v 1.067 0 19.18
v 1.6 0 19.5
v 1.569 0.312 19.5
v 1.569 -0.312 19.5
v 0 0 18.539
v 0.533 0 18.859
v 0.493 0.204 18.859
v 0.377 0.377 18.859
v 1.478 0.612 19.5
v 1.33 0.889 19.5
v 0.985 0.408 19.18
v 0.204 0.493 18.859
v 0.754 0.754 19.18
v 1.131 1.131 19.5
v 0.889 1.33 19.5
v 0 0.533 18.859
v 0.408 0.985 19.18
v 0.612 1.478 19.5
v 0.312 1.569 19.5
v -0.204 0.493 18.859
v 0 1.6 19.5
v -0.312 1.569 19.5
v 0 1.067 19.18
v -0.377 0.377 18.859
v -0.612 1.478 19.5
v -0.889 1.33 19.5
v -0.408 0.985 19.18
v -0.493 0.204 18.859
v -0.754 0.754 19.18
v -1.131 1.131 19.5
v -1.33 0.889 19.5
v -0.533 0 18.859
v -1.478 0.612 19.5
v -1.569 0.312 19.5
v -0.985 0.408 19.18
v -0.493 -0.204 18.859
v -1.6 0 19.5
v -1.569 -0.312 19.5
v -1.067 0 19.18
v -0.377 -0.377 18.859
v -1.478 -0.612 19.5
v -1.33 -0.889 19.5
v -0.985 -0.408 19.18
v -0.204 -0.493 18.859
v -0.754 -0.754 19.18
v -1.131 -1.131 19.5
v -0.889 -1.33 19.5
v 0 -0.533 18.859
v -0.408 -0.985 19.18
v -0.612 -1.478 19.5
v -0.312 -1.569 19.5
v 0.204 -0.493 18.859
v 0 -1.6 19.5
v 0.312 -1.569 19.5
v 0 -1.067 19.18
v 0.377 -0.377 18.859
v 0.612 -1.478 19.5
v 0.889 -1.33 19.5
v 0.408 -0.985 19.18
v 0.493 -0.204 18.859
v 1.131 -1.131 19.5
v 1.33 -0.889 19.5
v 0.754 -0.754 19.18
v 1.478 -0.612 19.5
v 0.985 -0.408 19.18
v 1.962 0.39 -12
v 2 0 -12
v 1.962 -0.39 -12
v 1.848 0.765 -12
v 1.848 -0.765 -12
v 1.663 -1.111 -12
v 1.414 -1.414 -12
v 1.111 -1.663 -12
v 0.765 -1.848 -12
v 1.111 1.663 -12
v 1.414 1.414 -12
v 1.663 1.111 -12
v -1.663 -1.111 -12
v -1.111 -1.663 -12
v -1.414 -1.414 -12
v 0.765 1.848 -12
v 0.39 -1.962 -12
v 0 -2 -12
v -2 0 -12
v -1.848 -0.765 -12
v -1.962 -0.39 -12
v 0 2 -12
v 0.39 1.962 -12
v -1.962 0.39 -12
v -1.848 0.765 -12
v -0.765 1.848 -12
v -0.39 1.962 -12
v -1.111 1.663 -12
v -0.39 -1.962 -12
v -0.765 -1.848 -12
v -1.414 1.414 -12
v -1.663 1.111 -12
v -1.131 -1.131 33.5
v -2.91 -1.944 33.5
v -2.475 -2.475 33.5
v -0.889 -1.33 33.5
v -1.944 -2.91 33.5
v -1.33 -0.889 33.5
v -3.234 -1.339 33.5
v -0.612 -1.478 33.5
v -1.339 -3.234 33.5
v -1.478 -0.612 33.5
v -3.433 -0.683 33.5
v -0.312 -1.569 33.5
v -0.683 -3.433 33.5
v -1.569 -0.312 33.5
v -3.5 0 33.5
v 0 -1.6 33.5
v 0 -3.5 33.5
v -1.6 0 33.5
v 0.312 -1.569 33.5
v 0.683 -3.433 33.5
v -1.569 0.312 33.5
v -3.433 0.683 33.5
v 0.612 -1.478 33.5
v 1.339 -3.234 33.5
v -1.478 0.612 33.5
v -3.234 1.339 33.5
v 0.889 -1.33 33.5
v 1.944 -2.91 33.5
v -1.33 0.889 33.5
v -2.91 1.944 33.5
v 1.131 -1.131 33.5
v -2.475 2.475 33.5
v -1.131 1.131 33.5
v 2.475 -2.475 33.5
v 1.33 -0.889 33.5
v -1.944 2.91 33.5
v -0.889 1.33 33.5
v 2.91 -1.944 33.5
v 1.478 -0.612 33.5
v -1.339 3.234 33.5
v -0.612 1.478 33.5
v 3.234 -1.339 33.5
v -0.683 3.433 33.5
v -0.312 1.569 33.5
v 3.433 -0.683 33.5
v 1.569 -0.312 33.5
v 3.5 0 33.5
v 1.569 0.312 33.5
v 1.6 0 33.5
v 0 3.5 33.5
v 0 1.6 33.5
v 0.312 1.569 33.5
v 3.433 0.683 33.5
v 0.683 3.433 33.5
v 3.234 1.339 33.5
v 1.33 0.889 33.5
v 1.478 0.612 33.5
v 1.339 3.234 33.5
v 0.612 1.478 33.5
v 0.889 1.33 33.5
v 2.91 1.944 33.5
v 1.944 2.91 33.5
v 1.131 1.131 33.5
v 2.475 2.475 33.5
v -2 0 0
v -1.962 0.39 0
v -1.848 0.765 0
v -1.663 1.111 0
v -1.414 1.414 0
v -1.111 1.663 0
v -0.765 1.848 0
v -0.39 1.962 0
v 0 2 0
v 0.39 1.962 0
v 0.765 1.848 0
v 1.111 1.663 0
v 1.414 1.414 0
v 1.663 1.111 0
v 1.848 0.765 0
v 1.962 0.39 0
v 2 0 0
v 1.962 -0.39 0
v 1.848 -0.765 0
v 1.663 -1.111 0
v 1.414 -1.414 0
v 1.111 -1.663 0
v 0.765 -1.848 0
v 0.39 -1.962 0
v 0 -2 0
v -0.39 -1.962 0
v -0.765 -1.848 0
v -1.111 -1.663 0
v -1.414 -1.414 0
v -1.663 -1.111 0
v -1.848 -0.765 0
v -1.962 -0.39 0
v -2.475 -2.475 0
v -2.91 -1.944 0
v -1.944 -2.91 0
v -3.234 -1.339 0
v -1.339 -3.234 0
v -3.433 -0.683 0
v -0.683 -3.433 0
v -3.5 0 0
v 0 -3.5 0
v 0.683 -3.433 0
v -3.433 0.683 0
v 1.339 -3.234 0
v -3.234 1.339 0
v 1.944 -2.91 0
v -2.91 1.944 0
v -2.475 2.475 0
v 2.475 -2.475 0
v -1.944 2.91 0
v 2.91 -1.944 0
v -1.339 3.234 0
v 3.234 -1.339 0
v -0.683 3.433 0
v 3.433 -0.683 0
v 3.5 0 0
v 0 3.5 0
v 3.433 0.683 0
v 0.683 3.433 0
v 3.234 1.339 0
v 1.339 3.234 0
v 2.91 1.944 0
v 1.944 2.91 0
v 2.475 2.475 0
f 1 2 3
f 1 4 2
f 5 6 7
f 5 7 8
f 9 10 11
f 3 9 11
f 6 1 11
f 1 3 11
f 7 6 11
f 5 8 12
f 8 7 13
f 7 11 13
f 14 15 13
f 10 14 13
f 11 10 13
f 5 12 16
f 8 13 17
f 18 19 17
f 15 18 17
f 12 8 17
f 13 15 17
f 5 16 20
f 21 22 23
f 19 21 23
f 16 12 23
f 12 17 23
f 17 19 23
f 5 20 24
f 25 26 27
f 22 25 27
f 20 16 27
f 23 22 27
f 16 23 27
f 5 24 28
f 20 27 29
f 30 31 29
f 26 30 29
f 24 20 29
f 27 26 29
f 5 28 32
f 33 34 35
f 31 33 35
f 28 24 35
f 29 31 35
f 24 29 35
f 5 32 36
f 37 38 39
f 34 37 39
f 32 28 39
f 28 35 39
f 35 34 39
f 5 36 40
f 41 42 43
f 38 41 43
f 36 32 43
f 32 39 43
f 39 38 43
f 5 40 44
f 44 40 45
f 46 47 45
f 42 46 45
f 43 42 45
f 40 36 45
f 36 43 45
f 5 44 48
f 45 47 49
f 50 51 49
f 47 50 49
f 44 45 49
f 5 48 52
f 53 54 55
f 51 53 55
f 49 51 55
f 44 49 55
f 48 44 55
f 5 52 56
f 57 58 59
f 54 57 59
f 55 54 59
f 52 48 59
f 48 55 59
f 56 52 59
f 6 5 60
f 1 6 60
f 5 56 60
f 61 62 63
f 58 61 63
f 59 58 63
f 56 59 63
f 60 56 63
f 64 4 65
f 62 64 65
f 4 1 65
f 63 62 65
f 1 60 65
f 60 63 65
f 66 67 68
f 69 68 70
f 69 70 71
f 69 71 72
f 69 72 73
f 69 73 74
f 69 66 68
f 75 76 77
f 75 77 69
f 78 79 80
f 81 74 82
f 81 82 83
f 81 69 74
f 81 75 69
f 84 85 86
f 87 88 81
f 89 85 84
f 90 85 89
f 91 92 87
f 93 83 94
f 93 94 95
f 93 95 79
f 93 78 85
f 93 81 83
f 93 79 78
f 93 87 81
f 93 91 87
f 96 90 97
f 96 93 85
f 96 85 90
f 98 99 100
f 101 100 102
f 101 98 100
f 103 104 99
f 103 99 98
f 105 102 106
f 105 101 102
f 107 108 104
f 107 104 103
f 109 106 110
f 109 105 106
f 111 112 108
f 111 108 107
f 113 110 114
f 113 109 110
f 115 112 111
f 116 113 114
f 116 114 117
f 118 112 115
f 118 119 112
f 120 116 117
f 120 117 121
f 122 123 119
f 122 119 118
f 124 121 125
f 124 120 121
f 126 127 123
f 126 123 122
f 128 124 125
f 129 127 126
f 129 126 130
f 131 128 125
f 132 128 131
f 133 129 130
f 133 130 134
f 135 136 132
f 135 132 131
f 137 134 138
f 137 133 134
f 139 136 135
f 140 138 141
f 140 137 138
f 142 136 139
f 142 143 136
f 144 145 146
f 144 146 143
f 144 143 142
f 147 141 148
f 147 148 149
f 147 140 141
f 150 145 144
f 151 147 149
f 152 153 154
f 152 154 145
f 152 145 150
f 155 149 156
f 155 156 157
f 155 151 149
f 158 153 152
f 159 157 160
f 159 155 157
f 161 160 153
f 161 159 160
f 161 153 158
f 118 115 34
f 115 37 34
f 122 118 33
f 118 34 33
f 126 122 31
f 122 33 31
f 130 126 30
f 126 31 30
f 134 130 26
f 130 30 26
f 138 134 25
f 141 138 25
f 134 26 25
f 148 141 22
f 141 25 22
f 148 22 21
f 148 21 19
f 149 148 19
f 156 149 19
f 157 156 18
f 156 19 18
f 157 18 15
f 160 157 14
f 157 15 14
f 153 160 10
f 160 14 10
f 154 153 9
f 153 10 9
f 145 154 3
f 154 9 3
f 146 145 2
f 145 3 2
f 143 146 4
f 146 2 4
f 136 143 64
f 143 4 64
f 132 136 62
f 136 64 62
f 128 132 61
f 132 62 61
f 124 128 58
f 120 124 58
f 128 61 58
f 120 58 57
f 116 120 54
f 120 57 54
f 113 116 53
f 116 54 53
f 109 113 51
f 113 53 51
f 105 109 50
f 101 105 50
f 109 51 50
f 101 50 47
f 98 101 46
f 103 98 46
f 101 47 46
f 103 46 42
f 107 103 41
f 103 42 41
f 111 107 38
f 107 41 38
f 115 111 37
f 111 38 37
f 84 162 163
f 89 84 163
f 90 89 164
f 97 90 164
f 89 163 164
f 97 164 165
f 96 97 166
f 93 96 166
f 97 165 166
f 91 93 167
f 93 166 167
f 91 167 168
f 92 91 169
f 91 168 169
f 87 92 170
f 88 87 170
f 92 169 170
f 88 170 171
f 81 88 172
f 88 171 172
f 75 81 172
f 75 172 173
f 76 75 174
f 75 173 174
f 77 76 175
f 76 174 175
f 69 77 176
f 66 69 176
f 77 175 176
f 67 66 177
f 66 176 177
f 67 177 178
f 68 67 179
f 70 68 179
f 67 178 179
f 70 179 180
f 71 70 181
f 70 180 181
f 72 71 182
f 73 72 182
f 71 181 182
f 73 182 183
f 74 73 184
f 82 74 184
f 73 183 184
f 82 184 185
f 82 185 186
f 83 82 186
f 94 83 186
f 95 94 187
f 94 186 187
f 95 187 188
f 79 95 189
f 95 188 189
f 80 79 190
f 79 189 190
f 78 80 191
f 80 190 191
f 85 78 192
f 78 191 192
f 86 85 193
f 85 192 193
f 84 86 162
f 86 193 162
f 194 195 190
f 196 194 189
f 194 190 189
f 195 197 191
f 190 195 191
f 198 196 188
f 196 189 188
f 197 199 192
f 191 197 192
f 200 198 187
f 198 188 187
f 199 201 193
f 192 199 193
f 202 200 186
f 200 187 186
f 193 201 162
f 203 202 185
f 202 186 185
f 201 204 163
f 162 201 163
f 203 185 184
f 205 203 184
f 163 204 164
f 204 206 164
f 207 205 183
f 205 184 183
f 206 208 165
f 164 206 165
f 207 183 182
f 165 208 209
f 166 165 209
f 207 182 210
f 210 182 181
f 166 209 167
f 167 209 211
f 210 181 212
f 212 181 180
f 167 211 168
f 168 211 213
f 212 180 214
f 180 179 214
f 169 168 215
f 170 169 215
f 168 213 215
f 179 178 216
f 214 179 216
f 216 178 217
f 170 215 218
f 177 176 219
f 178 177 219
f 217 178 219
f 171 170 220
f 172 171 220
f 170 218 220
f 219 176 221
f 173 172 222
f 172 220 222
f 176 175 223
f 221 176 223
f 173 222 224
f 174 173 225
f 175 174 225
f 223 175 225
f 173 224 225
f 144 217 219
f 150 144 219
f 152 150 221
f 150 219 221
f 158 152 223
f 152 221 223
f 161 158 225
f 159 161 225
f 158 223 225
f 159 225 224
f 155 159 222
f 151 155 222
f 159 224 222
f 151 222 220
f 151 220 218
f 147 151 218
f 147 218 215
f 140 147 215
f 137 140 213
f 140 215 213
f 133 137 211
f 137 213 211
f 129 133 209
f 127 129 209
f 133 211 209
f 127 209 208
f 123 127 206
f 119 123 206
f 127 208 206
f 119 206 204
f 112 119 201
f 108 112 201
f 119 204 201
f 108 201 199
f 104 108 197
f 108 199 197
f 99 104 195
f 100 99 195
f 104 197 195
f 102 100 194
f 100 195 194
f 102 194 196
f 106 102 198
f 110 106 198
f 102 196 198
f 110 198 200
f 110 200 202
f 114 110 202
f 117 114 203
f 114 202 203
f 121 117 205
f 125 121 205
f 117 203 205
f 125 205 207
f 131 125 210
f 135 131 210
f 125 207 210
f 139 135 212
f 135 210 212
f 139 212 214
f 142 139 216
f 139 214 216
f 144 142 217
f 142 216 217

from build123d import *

# Parameters (mm, degrees)
SKETCH1_R                   = 3.5
BOSS_EXTRUDE1_DEPTH         = 33.5
SKETCH2_R                   = 2
BOSS_EXTRUDE2_DEPTH         = 12
TAP_DRILL_FOR_M3_TAP1_D     = 3.2
TAP_DRILL_FOR_M3_TAP1_DEPTH = 14
TAP_DRILL_FOR_M3_TAP1_TIP   = 0.96137699


with BuildPart() as part:
    # Sketch1 → Boss-Extrude1 (new body)
    with BuildSketch(Plane.XY):
        Circle(SKETCH1_R)
    extrude(amount=BOSS_EXTRUDE1_DEPTH)

    # Sketch2 → Boss-Extrude2 (add)
    with BuildSketch(Plane(origin=(0, 0, 0), x_dir=(-1, 0, 0), z_dir=(0, 0, -1))):
        Circle(SKETCH2_R)
    extrude(amount=BOSS_EXTRUDE2_DEPTH)

    # Tap Drill for M3 Tap1
    with Locations(Plane.XY.offset(33.5)):
        with Locations((0, 0)):
            Hole(TAP_DRILL_FOR_M3_TAP1_D / 2, depth=TAP_DRILL_FOR_M3_TAP1_DEPTH)
            with Locations((0, 0, -(TAP_DRILL_FOR_M3_TAP1_DEPTH + TAP_DRILL_FOR_M3_TAP1_TIP / 2))):  # 118° drill point
                Cone(0, TAP_DRILL_FOR_M3_TAP1_D / 2, TAP_DRILL_FOR_M3_TAP1_TIP, mode=Mode.SUBTRACT)


solid = part.part
